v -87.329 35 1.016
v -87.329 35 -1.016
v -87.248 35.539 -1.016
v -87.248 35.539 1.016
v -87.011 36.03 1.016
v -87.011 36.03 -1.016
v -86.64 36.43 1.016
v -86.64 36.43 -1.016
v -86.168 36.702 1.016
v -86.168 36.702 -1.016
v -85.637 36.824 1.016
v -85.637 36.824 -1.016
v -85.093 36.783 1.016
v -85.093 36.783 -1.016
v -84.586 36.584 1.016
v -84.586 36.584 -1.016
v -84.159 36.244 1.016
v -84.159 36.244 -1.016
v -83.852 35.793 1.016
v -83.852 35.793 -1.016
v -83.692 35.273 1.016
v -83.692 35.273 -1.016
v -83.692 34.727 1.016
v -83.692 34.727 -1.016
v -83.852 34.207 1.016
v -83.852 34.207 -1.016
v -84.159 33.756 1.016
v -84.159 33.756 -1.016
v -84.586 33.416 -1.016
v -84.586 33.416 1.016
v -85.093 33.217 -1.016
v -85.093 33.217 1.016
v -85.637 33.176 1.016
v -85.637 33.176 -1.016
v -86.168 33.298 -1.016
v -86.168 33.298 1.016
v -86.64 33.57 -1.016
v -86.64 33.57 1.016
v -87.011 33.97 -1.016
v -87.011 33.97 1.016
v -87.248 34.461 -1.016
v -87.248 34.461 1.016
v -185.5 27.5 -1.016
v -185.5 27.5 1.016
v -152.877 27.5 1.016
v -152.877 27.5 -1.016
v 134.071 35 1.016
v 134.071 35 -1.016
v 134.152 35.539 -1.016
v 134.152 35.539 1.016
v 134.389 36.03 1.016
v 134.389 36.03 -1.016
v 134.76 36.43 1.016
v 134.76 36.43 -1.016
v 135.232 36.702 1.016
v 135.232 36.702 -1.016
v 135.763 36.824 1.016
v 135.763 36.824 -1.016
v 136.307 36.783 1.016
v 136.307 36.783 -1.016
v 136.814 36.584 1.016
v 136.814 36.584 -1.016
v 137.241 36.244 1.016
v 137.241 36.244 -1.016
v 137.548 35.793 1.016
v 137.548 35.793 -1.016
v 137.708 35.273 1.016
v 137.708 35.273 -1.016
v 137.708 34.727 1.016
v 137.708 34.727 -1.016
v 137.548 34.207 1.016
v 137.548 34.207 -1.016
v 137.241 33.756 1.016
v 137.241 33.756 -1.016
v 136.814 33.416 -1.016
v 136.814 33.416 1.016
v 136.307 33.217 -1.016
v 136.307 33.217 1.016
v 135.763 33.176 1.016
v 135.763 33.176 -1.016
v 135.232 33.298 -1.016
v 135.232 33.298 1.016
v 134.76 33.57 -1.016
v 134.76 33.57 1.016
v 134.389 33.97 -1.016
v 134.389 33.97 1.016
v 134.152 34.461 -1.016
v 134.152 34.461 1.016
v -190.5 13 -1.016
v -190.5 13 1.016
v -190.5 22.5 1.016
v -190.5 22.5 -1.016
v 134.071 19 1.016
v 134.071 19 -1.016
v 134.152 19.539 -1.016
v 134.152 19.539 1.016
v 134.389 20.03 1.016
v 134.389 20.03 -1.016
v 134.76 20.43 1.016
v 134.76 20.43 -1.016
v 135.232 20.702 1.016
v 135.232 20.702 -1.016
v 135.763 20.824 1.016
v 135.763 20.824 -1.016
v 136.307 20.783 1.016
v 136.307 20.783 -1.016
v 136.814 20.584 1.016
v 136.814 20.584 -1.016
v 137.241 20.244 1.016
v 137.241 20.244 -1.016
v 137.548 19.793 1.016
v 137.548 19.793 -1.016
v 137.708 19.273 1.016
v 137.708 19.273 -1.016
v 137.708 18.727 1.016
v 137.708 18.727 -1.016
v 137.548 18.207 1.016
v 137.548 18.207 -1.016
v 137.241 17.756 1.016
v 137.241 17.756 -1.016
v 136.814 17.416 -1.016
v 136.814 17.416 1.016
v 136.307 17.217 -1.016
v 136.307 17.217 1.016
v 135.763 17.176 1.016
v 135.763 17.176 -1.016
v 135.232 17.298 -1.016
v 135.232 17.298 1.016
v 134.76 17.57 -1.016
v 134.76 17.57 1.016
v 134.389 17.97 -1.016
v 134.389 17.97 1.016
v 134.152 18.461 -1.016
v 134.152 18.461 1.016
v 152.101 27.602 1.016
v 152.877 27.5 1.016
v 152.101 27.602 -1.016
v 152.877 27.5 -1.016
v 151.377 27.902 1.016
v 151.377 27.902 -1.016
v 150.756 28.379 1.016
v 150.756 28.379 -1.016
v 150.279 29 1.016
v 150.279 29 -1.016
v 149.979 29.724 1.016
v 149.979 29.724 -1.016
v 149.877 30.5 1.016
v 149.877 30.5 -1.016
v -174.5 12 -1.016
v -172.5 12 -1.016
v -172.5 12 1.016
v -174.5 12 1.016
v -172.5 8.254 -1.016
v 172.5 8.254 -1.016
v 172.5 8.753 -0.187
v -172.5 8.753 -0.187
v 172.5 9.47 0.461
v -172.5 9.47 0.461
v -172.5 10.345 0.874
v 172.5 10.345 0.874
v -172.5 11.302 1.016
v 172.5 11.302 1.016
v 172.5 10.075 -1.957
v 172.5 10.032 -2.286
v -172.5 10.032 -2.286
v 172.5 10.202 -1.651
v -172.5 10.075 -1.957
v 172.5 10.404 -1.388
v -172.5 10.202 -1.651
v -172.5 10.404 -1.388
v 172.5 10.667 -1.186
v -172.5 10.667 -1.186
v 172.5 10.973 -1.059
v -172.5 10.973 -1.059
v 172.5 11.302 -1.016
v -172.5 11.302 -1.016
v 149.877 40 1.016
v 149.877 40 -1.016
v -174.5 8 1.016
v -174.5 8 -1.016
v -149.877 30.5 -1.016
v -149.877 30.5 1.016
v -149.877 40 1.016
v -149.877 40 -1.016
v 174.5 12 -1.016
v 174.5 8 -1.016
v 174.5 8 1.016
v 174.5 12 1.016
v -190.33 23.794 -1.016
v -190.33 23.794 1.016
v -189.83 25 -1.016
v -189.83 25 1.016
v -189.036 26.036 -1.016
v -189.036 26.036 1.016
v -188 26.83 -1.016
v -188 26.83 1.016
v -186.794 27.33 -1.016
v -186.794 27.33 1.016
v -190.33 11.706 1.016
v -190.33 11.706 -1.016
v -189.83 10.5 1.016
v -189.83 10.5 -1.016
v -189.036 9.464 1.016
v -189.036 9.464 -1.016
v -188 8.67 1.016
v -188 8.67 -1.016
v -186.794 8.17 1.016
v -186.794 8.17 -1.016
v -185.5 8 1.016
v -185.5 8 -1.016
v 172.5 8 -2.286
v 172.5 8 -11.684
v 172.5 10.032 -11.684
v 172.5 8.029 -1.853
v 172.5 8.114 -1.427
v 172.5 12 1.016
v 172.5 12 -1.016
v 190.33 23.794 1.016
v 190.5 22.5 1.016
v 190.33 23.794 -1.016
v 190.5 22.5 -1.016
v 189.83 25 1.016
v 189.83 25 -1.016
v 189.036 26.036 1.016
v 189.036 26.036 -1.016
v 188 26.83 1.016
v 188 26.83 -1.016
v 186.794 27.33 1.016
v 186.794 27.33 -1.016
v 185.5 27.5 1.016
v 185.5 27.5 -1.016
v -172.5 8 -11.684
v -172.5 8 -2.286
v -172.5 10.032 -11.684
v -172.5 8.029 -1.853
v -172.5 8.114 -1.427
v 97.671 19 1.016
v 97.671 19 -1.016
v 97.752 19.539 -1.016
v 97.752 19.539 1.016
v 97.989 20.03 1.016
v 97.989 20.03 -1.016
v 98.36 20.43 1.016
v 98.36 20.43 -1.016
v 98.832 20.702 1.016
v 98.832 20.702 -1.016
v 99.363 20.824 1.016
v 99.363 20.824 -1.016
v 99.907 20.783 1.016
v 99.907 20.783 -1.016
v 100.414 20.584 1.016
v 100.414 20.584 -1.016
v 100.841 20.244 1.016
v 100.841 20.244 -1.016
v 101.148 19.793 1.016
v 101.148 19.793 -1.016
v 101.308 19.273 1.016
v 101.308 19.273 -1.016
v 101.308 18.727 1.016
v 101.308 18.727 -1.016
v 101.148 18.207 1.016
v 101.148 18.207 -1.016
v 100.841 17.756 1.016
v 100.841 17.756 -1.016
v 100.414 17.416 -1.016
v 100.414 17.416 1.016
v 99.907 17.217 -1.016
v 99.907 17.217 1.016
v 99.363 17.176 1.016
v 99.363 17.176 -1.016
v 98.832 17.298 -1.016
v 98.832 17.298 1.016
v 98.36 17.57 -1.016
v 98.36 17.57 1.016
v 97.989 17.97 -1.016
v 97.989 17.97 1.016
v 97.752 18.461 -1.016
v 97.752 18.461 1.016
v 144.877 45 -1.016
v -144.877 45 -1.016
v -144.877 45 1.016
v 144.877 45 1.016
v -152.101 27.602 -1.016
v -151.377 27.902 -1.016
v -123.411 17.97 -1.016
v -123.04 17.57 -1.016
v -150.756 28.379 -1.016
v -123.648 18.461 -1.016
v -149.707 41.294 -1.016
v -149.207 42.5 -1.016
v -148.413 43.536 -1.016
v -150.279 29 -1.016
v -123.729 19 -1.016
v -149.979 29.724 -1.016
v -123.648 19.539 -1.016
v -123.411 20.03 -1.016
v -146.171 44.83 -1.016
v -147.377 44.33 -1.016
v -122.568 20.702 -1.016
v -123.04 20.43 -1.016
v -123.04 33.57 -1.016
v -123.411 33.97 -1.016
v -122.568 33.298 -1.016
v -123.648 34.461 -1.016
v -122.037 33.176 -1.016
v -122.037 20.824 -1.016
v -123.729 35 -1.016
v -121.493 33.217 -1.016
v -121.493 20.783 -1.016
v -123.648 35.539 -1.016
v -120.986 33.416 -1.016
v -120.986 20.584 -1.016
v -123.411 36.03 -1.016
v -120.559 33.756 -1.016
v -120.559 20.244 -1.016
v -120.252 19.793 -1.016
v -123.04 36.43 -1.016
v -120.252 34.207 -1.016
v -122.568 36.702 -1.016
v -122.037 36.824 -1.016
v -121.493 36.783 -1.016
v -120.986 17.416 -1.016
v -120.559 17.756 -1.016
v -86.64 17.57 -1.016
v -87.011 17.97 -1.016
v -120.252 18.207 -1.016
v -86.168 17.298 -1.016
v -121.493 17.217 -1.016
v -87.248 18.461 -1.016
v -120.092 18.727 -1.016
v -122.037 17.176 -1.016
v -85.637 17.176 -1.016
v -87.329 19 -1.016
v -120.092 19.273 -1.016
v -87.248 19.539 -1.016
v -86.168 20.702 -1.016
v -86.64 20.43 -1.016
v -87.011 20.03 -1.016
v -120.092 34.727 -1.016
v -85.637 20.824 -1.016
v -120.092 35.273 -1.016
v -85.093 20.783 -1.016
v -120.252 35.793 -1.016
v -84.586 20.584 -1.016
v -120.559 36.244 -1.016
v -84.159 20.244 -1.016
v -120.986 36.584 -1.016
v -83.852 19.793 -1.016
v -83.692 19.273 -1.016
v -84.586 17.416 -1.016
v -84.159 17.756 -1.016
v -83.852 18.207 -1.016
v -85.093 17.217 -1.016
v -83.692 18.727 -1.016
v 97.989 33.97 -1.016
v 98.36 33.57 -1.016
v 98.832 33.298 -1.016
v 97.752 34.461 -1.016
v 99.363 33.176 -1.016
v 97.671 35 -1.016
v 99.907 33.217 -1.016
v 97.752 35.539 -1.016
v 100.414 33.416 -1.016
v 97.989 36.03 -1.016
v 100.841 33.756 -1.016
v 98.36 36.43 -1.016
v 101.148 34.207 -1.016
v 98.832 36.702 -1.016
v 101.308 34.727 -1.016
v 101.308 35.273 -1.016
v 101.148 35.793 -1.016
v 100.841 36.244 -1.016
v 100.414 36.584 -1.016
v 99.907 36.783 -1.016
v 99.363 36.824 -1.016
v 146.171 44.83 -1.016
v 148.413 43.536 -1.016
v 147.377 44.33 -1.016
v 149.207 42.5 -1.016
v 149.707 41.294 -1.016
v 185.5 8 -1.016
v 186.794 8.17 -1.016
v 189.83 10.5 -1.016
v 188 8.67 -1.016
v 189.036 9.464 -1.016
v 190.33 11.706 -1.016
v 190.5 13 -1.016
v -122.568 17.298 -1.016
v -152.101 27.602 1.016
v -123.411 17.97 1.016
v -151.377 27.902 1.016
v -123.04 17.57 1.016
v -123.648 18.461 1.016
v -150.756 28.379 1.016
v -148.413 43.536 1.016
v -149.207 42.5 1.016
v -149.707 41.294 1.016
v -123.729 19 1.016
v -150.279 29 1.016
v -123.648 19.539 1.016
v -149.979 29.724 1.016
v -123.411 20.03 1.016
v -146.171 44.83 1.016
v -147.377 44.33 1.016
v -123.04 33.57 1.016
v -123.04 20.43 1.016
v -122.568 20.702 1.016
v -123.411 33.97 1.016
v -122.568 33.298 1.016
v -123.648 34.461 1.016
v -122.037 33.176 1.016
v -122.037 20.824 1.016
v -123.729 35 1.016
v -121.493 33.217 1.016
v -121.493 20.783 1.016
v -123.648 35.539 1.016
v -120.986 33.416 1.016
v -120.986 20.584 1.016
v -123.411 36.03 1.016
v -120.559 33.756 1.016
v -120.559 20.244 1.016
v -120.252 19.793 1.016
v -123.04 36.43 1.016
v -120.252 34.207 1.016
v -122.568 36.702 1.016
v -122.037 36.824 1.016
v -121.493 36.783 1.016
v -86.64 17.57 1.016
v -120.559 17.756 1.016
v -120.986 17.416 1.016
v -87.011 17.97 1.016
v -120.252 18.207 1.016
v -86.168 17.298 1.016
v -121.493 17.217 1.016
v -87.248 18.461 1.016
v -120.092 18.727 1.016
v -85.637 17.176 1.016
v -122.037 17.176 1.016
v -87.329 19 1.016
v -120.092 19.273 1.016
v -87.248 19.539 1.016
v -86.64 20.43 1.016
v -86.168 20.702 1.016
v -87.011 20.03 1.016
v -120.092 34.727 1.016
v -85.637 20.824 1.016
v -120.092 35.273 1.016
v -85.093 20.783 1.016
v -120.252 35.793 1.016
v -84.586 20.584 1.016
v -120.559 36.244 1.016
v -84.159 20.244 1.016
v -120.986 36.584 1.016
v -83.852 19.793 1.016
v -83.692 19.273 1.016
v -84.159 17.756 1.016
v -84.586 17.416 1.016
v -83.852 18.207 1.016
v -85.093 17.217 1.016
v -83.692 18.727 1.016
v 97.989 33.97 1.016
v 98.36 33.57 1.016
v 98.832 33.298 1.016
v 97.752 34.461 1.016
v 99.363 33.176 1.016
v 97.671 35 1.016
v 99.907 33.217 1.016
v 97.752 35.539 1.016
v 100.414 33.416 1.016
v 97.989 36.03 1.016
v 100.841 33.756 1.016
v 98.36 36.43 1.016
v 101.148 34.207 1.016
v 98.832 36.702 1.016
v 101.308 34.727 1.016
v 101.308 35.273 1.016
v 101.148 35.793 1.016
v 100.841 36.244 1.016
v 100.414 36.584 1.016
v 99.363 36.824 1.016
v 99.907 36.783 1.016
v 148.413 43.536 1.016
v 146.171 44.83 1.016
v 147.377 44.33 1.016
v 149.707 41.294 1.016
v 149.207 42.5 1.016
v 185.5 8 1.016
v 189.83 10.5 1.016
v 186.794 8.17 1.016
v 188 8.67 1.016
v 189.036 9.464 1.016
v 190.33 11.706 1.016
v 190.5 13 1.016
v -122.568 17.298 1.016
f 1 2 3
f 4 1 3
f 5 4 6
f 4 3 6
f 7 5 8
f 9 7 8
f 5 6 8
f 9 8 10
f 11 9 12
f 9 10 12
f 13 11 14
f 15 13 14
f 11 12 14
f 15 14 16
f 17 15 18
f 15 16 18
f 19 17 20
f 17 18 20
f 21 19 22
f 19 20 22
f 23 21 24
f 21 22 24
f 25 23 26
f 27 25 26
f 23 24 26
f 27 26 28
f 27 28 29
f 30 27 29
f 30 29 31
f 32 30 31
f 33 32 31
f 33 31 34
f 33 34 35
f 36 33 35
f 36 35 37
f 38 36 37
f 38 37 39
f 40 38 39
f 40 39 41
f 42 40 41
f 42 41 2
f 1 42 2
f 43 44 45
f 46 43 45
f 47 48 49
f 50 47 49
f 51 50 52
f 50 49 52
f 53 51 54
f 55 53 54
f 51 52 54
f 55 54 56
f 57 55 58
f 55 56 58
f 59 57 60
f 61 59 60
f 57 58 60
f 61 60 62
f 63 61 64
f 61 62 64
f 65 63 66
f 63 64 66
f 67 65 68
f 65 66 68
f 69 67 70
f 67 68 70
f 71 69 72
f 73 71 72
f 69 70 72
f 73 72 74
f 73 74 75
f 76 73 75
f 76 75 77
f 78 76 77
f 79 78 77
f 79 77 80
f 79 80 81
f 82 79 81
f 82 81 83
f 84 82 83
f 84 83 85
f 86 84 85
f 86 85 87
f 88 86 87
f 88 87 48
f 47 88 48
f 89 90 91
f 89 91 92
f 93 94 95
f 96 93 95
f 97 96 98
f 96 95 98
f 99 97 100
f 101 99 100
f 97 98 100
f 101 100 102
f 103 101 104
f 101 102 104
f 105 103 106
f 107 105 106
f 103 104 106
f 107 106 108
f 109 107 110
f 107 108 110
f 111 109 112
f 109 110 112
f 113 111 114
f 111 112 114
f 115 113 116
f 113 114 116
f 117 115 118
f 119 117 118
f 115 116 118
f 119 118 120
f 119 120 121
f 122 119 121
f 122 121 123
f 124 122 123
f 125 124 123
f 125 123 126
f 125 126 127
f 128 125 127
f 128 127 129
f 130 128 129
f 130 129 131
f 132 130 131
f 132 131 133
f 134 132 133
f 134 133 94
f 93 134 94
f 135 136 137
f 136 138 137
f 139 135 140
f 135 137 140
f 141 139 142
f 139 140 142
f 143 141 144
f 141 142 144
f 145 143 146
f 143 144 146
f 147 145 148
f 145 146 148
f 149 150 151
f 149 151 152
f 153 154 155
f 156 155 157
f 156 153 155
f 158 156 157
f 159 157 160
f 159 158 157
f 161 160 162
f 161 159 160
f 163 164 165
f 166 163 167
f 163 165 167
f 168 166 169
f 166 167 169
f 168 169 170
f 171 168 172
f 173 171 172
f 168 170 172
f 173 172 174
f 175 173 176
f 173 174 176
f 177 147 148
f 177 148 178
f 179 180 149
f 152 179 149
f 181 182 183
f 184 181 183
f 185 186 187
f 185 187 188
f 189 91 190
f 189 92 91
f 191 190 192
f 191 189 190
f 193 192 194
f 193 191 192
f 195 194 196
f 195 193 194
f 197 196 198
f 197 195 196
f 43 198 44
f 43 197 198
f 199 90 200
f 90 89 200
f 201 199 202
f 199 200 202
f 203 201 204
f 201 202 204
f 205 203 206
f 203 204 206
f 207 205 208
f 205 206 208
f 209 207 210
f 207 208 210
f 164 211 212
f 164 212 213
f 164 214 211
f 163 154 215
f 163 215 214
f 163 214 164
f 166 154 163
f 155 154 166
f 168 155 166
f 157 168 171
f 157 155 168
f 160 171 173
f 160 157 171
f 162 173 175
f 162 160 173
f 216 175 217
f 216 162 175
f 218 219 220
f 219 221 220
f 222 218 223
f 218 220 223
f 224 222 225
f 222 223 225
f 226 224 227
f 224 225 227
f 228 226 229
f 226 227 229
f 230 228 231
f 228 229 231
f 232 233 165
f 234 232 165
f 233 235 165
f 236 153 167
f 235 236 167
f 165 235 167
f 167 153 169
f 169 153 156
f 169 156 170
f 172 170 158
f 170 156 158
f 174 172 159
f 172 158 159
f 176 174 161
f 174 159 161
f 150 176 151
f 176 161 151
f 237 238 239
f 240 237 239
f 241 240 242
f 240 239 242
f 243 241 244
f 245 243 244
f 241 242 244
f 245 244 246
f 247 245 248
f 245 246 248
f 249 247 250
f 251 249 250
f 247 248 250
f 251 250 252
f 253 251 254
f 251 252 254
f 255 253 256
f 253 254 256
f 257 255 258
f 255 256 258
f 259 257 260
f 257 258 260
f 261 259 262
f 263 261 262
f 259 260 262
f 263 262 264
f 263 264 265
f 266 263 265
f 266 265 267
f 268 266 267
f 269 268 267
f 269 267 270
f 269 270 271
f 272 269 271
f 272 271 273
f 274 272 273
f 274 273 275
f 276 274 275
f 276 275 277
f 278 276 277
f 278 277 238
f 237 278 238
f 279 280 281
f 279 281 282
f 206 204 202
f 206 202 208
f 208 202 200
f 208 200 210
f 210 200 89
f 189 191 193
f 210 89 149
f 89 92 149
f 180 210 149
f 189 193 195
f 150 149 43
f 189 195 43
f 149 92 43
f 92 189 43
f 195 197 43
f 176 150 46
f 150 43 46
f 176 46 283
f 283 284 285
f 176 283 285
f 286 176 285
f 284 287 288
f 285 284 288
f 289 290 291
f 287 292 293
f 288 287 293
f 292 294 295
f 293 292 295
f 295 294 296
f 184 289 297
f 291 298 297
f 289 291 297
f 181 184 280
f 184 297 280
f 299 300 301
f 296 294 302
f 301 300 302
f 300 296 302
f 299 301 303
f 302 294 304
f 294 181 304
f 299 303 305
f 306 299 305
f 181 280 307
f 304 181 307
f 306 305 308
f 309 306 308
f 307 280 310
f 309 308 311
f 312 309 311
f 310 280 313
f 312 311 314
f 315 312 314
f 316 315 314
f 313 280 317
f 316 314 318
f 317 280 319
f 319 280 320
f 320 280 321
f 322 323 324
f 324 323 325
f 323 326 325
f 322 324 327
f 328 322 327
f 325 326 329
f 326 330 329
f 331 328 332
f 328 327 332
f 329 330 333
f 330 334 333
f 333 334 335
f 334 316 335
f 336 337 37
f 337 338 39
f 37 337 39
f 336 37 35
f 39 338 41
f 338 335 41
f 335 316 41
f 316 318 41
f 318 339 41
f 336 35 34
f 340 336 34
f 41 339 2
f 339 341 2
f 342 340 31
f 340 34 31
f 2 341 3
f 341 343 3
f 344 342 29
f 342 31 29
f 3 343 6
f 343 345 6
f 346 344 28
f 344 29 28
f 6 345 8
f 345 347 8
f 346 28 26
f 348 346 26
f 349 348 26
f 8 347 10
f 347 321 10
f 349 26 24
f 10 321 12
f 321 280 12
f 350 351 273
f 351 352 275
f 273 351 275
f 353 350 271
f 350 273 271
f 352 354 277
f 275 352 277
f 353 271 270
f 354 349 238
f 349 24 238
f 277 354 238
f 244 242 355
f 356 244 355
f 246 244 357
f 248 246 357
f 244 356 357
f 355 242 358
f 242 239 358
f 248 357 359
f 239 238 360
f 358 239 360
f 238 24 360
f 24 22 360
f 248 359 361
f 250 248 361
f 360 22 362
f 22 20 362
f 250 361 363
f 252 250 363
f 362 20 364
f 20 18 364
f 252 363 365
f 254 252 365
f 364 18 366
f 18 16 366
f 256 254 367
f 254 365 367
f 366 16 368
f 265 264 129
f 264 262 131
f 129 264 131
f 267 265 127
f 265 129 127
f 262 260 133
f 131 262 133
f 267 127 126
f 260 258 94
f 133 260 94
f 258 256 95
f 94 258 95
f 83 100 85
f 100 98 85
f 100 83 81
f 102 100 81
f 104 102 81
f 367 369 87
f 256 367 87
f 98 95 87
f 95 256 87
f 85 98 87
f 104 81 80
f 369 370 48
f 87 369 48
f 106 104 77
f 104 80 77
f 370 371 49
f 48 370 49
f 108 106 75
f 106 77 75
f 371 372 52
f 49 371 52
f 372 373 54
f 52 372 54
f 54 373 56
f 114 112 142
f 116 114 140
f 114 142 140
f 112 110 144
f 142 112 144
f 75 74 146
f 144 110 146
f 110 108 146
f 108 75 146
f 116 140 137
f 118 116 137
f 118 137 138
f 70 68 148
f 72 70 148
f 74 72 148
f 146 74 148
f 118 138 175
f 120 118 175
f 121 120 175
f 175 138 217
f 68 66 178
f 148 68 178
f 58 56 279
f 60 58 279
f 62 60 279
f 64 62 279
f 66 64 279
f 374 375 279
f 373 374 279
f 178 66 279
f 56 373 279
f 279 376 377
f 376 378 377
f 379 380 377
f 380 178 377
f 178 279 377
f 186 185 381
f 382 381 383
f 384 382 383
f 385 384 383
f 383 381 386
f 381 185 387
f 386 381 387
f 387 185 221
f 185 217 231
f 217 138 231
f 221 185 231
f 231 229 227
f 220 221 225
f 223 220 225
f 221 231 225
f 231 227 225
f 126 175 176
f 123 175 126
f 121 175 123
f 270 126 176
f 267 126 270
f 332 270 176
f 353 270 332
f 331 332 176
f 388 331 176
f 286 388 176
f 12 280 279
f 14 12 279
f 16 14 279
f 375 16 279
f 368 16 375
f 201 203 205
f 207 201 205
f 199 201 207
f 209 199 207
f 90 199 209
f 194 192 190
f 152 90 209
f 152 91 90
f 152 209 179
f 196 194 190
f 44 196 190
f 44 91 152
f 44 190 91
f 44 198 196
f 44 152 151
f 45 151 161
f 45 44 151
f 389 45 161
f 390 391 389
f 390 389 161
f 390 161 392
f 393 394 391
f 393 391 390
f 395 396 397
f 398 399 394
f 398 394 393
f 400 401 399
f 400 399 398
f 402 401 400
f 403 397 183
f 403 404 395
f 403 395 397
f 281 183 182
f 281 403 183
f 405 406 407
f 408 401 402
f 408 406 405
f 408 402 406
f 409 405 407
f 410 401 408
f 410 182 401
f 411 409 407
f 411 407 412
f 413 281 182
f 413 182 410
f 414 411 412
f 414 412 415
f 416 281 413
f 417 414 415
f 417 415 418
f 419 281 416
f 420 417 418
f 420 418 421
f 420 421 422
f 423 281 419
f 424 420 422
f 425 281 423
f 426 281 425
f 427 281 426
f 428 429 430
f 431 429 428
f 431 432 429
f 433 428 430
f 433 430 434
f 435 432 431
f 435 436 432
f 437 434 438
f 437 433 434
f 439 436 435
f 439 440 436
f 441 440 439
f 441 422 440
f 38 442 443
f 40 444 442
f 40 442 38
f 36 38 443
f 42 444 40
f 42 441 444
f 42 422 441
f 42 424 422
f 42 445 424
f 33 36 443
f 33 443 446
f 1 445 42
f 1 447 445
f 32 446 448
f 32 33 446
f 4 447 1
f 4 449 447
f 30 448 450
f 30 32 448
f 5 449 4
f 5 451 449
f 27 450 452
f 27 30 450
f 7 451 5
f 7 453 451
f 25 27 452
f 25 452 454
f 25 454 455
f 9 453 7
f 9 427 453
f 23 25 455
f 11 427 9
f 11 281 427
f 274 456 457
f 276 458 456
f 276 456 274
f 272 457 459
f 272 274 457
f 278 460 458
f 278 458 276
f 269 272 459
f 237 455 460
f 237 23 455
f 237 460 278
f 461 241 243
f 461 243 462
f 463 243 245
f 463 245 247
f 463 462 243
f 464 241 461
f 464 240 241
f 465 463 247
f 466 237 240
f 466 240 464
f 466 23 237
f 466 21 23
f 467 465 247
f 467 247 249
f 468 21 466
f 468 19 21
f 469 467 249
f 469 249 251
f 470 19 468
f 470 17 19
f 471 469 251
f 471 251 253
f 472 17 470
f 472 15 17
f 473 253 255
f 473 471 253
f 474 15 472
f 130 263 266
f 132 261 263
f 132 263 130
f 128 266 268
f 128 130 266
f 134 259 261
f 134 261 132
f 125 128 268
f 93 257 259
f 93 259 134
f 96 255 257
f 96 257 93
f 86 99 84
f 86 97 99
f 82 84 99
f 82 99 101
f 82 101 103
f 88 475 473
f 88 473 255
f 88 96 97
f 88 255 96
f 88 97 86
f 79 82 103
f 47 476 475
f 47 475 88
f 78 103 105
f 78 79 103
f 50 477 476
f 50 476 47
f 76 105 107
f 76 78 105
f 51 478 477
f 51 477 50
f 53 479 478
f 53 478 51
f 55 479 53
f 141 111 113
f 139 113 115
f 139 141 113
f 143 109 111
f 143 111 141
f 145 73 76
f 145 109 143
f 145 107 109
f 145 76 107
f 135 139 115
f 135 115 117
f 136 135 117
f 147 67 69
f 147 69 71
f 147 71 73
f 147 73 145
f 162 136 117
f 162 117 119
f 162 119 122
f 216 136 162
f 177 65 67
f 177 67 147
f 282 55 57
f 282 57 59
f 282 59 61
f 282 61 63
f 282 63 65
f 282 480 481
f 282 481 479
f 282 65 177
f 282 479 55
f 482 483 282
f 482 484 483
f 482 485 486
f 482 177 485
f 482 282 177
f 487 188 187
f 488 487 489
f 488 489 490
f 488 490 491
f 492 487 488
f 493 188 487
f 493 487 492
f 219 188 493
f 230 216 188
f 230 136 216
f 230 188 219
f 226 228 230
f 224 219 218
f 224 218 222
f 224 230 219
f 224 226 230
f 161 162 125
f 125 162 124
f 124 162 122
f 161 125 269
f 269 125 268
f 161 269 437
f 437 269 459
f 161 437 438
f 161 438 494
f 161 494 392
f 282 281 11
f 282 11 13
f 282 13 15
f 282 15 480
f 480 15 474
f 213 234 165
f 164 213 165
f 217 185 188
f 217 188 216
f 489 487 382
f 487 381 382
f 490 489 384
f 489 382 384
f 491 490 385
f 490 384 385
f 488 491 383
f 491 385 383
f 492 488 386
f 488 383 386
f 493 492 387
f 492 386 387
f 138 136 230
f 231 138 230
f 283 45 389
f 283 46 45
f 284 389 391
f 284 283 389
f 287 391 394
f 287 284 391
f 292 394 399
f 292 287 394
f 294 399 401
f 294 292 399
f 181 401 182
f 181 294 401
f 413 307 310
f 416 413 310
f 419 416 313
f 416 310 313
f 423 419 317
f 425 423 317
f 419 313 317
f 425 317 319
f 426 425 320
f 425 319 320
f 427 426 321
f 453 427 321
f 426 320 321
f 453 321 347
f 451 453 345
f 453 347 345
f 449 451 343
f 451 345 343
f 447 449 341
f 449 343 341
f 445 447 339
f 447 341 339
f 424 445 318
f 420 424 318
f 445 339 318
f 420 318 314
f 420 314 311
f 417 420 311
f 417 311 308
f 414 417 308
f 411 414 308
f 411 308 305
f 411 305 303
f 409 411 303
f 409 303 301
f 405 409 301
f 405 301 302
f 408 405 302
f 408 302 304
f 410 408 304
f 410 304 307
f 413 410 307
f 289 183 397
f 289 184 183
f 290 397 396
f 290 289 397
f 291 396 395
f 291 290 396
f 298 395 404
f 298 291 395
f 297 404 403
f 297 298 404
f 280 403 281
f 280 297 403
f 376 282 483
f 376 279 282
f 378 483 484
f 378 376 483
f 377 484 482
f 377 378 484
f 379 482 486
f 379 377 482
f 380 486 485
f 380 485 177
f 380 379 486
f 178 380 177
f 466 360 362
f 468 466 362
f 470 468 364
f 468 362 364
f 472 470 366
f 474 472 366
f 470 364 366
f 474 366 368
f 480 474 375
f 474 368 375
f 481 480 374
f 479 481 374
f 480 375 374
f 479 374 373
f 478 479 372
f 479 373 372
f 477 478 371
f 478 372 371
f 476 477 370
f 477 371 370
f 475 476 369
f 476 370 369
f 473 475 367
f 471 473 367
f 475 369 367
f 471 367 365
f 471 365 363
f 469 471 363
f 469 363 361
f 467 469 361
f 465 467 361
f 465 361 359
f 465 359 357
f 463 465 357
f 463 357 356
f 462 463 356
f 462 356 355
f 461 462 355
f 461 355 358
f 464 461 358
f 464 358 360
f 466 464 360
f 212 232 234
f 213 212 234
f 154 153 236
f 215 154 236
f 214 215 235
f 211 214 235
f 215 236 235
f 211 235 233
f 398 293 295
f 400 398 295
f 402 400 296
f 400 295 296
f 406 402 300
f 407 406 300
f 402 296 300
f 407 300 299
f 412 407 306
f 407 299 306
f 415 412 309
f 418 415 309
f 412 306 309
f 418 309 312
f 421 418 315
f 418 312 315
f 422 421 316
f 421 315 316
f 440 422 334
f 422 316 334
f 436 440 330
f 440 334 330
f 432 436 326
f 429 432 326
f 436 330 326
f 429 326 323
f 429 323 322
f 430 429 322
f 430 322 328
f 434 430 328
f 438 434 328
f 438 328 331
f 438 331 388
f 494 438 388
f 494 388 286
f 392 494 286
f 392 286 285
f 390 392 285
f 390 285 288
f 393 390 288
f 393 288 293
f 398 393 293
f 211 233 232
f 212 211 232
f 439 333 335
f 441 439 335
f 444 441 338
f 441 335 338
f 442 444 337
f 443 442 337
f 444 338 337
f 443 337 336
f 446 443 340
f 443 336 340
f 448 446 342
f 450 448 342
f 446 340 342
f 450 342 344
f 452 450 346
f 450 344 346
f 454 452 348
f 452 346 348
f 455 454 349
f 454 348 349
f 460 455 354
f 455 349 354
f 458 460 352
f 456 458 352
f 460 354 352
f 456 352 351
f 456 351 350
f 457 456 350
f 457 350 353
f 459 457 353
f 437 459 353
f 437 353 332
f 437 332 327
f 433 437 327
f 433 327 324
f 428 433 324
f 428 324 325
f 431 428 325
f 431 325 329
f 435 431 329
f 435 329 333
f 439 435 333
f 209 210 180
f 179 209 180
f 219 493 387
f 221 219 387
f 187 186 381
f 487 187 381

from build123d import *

# Parameters (mm, degrees)
BOSS_EXTRUDE1_START        = 8
SKETCH2_W                  = 381
SKETCH2_H                  = 2.032
BOSS_EXTRUDE1_DEPTH        = 37
SKETCH3_W                  = 345
SKETCH3_H                  = 2.032
BOSS_EXTRUDE2_DEPTH        = 10.668
SKETCH4_W                  = 40.623
SKETCH4_H                  = 17.5
CUT_EXTRUDE1_DEPTH         = 3
F_6_CLEARANCE_HOLE1_D      = 3.6576
FILLET2_R                  = 5
FILLET3_R                  = 3
SKETCH8_W                  = 2
SKETCH8_H                  = 4
CUT_EXTRUDE2_DEPTH         = 197.033303864
FLATTEN_BENDS1_START       = -11.684
FLATTEN_BENDS1_OUTLINE_W   = 345
FLATTEN_BENDS1_OUTLINE_H   = 2.032
FLATTEN_BENDS1_DEPTH       = 10.668
FLATTEN_BENDS1_START_2     = -1.016
FLATTEN_BENDS1_2_OUTLINE_W = 345
FLATTEN_BENDS1_2_OUTLINE_H = 9.367654589
FLATTEN_BENDS1_2_DEPTH     = 2.032
PROCESS_BENDS1_START       = -172.5
PROCESS_BENDS1_DEPTH       = 345
PROCESS_BENDS1_2_DEPTH     = 345


# Read off the part's stored shape, not the designer's step: Flatten-Bends1, Process-Bends1
with BuildPart() as part:
    # Sketch2 → Boss-Extrude1 (new body)
    with BuildSketch(Plane(origin=(0, 0, 0), x_dir=(1, 0, 0), z_dir=(0, 1, 0)).offset(BOSS_EXTRUDE1_START)):
        Rectangle(SKETCH2_W, SKETCH2_H)
    extrude(amount=BOSS_EXTRUDE1_DEPTH)

    # Sketch3 → Boss-Extrude2 (add)
    with BuildSketch(Plane(origin=(0, 0, -1.016), x_dir=(-1, 0, 0), z_dir=(0, 0, -1))):
        with Locations((0, 9.016)):
            Rectangle(SKETCH3_W, SKETCH3_H)
    extrude(amount=BOSS_EXTRUDE2_DEPTH)

    # Sketch4 → Cut-Extrude1 (cut)
    with BuildSketch(Plane.XY.offset(1.016)):
        with Locations((170.1885, 36.25)):
            Rectangle(SKETCH4_W, SKETCH4_H)
        with Locations((-170.1885, 36.25)):
            Rectangle(SKETCH4_W, SKETCH4_H)
    extrude(amount=-CUT_EXTRUDE1_DEPTH, mode=Mode.SUBTRACT)

    # #6 Clearance Hole1 (through all)
    with Locations(Plane.XY.offset(1.016)):
        with Locations((-121.9, 35), (-121.9, 19), (-85.5, 35), (-85.5, 19), (99.5, 19), (99.5, 35), (135.9, 35), (135.9, 19)):
            Hole(F_6_CLEARANCE_HOLE1_D / 2)

    # Fillet2
    fillet2_edges = [part.edges().sort_by_distance(p)[0] for p in [
        (-190.5, 27.5, 0),
        (-149.877, 45, 0),
        (190.5, 27.5, 0),
        (149.877, 45, 0),
        (-190.5, 8, 0),
        (190.5, 8, 0),
    ]]
    fillet(fillet2_edges, radius=FILLET2_R)

    # Fillet3
    fillet3_edges = [part.edges().sort_by_distance(p)[0] for p in [
        (-149.877, 27.5, 0),
        (149.877, 27.5, 0),
    ]]
    fillet(fillet3_edges, radius=FILLET3_R)

    # Sketch8 → Cut-Extrude2 (cut, through all)
    with BuildSketch(Plane(origin=(0, 0, -1.016), x_dir=(-1, 0, 0), z_dir=(0, 0, -1))):
        with Locations((173.5, 10)):
            Rectangle(SKETCH8_W, SKETCH8_H)
        with Locations((-173.5, 10)):
            Rectangle(SKETCH8_W, SKETCH8_H)
    extrude(amount=-CUT_EXTRUDE2_DEPTH, mode=Mode.SUBTRACT)

    # Flatten-Bends1 outline → Flatten-Bends1 (cut)
    with BuildSketch(Plane.XY.offset(FLATTEN_BENDS1_START)):
        with Locations((0, 9.016)):
            Rectangle(FLATTEN_BENDS1_OUTLINE_W, FLATTEN_BENDS1_OUTLINE_H)
    extrude(amount=FLATTEN_BENDS1_DEPTH, mode=Mode.SUBTRACT)

    # Flatten-Bends1 2 outline → Flatten-Bends1 2 (add)
    with BuildSketch(Plane.XY.offset(FLATTEN_BENDS1_START_2)):
        with Locations((0, 3.316172706)):
            Rectangle(FLATTEN_BENDS1_2_OUTLINE_W, FLATTEN_BENDS1_2_OUTLINE_H)
    extrude(amount=FLATTEN_BENDS1_2_DEPTH)

    # Process-Bends1 outline → Process-Bends1 (cut)
    with BuildSketch(Plane.YZ.offset(PROCESS_BENDS1_START)):
        with BuildLine():
            Line((-1.367654589, -1.016), (8.254000001, -1.016))
            ThreePointArc((8.254000001, -1.016), (9.470379953, 0.461430071), (11.302, 1.016))
            Line((11.302, 1.016), (-1.367654589, 1.016))
            Line((-1.367654589, 1.016), (-1.367654589, -1.016))
        make_face()
    extrude(amount=PROCESS_BENDS1_DEPTH, mode=Mode.SUBTRACT)

    # Process-Bends1 2 outline → Process-Bends1 2 (add)
    with BuildSketch(Plane.YZ.offset(PROCESS_BENDS1_START)):
        with BuildLine():
            Line((8, -2.286), (8, -11.684))
            Line((8, -11.684), (10.032, -11.684))
            Line((10.032, -11.684), (10.032, -2.286))
            ThreePointArc((10.032, -2.286), (10.403974388, -1.387974388), (11.302, -1.016))
            Line((11.302, -1.016), (8.254000001, -1.016))
            ThreePointArc((8.254000001, -1.016), (8.064122609, -1.638424522), (8, -2.286))
        make_face()
    extrude(amount=PROCESS_BENDS1_2_DEPTH)


solid = part.part
